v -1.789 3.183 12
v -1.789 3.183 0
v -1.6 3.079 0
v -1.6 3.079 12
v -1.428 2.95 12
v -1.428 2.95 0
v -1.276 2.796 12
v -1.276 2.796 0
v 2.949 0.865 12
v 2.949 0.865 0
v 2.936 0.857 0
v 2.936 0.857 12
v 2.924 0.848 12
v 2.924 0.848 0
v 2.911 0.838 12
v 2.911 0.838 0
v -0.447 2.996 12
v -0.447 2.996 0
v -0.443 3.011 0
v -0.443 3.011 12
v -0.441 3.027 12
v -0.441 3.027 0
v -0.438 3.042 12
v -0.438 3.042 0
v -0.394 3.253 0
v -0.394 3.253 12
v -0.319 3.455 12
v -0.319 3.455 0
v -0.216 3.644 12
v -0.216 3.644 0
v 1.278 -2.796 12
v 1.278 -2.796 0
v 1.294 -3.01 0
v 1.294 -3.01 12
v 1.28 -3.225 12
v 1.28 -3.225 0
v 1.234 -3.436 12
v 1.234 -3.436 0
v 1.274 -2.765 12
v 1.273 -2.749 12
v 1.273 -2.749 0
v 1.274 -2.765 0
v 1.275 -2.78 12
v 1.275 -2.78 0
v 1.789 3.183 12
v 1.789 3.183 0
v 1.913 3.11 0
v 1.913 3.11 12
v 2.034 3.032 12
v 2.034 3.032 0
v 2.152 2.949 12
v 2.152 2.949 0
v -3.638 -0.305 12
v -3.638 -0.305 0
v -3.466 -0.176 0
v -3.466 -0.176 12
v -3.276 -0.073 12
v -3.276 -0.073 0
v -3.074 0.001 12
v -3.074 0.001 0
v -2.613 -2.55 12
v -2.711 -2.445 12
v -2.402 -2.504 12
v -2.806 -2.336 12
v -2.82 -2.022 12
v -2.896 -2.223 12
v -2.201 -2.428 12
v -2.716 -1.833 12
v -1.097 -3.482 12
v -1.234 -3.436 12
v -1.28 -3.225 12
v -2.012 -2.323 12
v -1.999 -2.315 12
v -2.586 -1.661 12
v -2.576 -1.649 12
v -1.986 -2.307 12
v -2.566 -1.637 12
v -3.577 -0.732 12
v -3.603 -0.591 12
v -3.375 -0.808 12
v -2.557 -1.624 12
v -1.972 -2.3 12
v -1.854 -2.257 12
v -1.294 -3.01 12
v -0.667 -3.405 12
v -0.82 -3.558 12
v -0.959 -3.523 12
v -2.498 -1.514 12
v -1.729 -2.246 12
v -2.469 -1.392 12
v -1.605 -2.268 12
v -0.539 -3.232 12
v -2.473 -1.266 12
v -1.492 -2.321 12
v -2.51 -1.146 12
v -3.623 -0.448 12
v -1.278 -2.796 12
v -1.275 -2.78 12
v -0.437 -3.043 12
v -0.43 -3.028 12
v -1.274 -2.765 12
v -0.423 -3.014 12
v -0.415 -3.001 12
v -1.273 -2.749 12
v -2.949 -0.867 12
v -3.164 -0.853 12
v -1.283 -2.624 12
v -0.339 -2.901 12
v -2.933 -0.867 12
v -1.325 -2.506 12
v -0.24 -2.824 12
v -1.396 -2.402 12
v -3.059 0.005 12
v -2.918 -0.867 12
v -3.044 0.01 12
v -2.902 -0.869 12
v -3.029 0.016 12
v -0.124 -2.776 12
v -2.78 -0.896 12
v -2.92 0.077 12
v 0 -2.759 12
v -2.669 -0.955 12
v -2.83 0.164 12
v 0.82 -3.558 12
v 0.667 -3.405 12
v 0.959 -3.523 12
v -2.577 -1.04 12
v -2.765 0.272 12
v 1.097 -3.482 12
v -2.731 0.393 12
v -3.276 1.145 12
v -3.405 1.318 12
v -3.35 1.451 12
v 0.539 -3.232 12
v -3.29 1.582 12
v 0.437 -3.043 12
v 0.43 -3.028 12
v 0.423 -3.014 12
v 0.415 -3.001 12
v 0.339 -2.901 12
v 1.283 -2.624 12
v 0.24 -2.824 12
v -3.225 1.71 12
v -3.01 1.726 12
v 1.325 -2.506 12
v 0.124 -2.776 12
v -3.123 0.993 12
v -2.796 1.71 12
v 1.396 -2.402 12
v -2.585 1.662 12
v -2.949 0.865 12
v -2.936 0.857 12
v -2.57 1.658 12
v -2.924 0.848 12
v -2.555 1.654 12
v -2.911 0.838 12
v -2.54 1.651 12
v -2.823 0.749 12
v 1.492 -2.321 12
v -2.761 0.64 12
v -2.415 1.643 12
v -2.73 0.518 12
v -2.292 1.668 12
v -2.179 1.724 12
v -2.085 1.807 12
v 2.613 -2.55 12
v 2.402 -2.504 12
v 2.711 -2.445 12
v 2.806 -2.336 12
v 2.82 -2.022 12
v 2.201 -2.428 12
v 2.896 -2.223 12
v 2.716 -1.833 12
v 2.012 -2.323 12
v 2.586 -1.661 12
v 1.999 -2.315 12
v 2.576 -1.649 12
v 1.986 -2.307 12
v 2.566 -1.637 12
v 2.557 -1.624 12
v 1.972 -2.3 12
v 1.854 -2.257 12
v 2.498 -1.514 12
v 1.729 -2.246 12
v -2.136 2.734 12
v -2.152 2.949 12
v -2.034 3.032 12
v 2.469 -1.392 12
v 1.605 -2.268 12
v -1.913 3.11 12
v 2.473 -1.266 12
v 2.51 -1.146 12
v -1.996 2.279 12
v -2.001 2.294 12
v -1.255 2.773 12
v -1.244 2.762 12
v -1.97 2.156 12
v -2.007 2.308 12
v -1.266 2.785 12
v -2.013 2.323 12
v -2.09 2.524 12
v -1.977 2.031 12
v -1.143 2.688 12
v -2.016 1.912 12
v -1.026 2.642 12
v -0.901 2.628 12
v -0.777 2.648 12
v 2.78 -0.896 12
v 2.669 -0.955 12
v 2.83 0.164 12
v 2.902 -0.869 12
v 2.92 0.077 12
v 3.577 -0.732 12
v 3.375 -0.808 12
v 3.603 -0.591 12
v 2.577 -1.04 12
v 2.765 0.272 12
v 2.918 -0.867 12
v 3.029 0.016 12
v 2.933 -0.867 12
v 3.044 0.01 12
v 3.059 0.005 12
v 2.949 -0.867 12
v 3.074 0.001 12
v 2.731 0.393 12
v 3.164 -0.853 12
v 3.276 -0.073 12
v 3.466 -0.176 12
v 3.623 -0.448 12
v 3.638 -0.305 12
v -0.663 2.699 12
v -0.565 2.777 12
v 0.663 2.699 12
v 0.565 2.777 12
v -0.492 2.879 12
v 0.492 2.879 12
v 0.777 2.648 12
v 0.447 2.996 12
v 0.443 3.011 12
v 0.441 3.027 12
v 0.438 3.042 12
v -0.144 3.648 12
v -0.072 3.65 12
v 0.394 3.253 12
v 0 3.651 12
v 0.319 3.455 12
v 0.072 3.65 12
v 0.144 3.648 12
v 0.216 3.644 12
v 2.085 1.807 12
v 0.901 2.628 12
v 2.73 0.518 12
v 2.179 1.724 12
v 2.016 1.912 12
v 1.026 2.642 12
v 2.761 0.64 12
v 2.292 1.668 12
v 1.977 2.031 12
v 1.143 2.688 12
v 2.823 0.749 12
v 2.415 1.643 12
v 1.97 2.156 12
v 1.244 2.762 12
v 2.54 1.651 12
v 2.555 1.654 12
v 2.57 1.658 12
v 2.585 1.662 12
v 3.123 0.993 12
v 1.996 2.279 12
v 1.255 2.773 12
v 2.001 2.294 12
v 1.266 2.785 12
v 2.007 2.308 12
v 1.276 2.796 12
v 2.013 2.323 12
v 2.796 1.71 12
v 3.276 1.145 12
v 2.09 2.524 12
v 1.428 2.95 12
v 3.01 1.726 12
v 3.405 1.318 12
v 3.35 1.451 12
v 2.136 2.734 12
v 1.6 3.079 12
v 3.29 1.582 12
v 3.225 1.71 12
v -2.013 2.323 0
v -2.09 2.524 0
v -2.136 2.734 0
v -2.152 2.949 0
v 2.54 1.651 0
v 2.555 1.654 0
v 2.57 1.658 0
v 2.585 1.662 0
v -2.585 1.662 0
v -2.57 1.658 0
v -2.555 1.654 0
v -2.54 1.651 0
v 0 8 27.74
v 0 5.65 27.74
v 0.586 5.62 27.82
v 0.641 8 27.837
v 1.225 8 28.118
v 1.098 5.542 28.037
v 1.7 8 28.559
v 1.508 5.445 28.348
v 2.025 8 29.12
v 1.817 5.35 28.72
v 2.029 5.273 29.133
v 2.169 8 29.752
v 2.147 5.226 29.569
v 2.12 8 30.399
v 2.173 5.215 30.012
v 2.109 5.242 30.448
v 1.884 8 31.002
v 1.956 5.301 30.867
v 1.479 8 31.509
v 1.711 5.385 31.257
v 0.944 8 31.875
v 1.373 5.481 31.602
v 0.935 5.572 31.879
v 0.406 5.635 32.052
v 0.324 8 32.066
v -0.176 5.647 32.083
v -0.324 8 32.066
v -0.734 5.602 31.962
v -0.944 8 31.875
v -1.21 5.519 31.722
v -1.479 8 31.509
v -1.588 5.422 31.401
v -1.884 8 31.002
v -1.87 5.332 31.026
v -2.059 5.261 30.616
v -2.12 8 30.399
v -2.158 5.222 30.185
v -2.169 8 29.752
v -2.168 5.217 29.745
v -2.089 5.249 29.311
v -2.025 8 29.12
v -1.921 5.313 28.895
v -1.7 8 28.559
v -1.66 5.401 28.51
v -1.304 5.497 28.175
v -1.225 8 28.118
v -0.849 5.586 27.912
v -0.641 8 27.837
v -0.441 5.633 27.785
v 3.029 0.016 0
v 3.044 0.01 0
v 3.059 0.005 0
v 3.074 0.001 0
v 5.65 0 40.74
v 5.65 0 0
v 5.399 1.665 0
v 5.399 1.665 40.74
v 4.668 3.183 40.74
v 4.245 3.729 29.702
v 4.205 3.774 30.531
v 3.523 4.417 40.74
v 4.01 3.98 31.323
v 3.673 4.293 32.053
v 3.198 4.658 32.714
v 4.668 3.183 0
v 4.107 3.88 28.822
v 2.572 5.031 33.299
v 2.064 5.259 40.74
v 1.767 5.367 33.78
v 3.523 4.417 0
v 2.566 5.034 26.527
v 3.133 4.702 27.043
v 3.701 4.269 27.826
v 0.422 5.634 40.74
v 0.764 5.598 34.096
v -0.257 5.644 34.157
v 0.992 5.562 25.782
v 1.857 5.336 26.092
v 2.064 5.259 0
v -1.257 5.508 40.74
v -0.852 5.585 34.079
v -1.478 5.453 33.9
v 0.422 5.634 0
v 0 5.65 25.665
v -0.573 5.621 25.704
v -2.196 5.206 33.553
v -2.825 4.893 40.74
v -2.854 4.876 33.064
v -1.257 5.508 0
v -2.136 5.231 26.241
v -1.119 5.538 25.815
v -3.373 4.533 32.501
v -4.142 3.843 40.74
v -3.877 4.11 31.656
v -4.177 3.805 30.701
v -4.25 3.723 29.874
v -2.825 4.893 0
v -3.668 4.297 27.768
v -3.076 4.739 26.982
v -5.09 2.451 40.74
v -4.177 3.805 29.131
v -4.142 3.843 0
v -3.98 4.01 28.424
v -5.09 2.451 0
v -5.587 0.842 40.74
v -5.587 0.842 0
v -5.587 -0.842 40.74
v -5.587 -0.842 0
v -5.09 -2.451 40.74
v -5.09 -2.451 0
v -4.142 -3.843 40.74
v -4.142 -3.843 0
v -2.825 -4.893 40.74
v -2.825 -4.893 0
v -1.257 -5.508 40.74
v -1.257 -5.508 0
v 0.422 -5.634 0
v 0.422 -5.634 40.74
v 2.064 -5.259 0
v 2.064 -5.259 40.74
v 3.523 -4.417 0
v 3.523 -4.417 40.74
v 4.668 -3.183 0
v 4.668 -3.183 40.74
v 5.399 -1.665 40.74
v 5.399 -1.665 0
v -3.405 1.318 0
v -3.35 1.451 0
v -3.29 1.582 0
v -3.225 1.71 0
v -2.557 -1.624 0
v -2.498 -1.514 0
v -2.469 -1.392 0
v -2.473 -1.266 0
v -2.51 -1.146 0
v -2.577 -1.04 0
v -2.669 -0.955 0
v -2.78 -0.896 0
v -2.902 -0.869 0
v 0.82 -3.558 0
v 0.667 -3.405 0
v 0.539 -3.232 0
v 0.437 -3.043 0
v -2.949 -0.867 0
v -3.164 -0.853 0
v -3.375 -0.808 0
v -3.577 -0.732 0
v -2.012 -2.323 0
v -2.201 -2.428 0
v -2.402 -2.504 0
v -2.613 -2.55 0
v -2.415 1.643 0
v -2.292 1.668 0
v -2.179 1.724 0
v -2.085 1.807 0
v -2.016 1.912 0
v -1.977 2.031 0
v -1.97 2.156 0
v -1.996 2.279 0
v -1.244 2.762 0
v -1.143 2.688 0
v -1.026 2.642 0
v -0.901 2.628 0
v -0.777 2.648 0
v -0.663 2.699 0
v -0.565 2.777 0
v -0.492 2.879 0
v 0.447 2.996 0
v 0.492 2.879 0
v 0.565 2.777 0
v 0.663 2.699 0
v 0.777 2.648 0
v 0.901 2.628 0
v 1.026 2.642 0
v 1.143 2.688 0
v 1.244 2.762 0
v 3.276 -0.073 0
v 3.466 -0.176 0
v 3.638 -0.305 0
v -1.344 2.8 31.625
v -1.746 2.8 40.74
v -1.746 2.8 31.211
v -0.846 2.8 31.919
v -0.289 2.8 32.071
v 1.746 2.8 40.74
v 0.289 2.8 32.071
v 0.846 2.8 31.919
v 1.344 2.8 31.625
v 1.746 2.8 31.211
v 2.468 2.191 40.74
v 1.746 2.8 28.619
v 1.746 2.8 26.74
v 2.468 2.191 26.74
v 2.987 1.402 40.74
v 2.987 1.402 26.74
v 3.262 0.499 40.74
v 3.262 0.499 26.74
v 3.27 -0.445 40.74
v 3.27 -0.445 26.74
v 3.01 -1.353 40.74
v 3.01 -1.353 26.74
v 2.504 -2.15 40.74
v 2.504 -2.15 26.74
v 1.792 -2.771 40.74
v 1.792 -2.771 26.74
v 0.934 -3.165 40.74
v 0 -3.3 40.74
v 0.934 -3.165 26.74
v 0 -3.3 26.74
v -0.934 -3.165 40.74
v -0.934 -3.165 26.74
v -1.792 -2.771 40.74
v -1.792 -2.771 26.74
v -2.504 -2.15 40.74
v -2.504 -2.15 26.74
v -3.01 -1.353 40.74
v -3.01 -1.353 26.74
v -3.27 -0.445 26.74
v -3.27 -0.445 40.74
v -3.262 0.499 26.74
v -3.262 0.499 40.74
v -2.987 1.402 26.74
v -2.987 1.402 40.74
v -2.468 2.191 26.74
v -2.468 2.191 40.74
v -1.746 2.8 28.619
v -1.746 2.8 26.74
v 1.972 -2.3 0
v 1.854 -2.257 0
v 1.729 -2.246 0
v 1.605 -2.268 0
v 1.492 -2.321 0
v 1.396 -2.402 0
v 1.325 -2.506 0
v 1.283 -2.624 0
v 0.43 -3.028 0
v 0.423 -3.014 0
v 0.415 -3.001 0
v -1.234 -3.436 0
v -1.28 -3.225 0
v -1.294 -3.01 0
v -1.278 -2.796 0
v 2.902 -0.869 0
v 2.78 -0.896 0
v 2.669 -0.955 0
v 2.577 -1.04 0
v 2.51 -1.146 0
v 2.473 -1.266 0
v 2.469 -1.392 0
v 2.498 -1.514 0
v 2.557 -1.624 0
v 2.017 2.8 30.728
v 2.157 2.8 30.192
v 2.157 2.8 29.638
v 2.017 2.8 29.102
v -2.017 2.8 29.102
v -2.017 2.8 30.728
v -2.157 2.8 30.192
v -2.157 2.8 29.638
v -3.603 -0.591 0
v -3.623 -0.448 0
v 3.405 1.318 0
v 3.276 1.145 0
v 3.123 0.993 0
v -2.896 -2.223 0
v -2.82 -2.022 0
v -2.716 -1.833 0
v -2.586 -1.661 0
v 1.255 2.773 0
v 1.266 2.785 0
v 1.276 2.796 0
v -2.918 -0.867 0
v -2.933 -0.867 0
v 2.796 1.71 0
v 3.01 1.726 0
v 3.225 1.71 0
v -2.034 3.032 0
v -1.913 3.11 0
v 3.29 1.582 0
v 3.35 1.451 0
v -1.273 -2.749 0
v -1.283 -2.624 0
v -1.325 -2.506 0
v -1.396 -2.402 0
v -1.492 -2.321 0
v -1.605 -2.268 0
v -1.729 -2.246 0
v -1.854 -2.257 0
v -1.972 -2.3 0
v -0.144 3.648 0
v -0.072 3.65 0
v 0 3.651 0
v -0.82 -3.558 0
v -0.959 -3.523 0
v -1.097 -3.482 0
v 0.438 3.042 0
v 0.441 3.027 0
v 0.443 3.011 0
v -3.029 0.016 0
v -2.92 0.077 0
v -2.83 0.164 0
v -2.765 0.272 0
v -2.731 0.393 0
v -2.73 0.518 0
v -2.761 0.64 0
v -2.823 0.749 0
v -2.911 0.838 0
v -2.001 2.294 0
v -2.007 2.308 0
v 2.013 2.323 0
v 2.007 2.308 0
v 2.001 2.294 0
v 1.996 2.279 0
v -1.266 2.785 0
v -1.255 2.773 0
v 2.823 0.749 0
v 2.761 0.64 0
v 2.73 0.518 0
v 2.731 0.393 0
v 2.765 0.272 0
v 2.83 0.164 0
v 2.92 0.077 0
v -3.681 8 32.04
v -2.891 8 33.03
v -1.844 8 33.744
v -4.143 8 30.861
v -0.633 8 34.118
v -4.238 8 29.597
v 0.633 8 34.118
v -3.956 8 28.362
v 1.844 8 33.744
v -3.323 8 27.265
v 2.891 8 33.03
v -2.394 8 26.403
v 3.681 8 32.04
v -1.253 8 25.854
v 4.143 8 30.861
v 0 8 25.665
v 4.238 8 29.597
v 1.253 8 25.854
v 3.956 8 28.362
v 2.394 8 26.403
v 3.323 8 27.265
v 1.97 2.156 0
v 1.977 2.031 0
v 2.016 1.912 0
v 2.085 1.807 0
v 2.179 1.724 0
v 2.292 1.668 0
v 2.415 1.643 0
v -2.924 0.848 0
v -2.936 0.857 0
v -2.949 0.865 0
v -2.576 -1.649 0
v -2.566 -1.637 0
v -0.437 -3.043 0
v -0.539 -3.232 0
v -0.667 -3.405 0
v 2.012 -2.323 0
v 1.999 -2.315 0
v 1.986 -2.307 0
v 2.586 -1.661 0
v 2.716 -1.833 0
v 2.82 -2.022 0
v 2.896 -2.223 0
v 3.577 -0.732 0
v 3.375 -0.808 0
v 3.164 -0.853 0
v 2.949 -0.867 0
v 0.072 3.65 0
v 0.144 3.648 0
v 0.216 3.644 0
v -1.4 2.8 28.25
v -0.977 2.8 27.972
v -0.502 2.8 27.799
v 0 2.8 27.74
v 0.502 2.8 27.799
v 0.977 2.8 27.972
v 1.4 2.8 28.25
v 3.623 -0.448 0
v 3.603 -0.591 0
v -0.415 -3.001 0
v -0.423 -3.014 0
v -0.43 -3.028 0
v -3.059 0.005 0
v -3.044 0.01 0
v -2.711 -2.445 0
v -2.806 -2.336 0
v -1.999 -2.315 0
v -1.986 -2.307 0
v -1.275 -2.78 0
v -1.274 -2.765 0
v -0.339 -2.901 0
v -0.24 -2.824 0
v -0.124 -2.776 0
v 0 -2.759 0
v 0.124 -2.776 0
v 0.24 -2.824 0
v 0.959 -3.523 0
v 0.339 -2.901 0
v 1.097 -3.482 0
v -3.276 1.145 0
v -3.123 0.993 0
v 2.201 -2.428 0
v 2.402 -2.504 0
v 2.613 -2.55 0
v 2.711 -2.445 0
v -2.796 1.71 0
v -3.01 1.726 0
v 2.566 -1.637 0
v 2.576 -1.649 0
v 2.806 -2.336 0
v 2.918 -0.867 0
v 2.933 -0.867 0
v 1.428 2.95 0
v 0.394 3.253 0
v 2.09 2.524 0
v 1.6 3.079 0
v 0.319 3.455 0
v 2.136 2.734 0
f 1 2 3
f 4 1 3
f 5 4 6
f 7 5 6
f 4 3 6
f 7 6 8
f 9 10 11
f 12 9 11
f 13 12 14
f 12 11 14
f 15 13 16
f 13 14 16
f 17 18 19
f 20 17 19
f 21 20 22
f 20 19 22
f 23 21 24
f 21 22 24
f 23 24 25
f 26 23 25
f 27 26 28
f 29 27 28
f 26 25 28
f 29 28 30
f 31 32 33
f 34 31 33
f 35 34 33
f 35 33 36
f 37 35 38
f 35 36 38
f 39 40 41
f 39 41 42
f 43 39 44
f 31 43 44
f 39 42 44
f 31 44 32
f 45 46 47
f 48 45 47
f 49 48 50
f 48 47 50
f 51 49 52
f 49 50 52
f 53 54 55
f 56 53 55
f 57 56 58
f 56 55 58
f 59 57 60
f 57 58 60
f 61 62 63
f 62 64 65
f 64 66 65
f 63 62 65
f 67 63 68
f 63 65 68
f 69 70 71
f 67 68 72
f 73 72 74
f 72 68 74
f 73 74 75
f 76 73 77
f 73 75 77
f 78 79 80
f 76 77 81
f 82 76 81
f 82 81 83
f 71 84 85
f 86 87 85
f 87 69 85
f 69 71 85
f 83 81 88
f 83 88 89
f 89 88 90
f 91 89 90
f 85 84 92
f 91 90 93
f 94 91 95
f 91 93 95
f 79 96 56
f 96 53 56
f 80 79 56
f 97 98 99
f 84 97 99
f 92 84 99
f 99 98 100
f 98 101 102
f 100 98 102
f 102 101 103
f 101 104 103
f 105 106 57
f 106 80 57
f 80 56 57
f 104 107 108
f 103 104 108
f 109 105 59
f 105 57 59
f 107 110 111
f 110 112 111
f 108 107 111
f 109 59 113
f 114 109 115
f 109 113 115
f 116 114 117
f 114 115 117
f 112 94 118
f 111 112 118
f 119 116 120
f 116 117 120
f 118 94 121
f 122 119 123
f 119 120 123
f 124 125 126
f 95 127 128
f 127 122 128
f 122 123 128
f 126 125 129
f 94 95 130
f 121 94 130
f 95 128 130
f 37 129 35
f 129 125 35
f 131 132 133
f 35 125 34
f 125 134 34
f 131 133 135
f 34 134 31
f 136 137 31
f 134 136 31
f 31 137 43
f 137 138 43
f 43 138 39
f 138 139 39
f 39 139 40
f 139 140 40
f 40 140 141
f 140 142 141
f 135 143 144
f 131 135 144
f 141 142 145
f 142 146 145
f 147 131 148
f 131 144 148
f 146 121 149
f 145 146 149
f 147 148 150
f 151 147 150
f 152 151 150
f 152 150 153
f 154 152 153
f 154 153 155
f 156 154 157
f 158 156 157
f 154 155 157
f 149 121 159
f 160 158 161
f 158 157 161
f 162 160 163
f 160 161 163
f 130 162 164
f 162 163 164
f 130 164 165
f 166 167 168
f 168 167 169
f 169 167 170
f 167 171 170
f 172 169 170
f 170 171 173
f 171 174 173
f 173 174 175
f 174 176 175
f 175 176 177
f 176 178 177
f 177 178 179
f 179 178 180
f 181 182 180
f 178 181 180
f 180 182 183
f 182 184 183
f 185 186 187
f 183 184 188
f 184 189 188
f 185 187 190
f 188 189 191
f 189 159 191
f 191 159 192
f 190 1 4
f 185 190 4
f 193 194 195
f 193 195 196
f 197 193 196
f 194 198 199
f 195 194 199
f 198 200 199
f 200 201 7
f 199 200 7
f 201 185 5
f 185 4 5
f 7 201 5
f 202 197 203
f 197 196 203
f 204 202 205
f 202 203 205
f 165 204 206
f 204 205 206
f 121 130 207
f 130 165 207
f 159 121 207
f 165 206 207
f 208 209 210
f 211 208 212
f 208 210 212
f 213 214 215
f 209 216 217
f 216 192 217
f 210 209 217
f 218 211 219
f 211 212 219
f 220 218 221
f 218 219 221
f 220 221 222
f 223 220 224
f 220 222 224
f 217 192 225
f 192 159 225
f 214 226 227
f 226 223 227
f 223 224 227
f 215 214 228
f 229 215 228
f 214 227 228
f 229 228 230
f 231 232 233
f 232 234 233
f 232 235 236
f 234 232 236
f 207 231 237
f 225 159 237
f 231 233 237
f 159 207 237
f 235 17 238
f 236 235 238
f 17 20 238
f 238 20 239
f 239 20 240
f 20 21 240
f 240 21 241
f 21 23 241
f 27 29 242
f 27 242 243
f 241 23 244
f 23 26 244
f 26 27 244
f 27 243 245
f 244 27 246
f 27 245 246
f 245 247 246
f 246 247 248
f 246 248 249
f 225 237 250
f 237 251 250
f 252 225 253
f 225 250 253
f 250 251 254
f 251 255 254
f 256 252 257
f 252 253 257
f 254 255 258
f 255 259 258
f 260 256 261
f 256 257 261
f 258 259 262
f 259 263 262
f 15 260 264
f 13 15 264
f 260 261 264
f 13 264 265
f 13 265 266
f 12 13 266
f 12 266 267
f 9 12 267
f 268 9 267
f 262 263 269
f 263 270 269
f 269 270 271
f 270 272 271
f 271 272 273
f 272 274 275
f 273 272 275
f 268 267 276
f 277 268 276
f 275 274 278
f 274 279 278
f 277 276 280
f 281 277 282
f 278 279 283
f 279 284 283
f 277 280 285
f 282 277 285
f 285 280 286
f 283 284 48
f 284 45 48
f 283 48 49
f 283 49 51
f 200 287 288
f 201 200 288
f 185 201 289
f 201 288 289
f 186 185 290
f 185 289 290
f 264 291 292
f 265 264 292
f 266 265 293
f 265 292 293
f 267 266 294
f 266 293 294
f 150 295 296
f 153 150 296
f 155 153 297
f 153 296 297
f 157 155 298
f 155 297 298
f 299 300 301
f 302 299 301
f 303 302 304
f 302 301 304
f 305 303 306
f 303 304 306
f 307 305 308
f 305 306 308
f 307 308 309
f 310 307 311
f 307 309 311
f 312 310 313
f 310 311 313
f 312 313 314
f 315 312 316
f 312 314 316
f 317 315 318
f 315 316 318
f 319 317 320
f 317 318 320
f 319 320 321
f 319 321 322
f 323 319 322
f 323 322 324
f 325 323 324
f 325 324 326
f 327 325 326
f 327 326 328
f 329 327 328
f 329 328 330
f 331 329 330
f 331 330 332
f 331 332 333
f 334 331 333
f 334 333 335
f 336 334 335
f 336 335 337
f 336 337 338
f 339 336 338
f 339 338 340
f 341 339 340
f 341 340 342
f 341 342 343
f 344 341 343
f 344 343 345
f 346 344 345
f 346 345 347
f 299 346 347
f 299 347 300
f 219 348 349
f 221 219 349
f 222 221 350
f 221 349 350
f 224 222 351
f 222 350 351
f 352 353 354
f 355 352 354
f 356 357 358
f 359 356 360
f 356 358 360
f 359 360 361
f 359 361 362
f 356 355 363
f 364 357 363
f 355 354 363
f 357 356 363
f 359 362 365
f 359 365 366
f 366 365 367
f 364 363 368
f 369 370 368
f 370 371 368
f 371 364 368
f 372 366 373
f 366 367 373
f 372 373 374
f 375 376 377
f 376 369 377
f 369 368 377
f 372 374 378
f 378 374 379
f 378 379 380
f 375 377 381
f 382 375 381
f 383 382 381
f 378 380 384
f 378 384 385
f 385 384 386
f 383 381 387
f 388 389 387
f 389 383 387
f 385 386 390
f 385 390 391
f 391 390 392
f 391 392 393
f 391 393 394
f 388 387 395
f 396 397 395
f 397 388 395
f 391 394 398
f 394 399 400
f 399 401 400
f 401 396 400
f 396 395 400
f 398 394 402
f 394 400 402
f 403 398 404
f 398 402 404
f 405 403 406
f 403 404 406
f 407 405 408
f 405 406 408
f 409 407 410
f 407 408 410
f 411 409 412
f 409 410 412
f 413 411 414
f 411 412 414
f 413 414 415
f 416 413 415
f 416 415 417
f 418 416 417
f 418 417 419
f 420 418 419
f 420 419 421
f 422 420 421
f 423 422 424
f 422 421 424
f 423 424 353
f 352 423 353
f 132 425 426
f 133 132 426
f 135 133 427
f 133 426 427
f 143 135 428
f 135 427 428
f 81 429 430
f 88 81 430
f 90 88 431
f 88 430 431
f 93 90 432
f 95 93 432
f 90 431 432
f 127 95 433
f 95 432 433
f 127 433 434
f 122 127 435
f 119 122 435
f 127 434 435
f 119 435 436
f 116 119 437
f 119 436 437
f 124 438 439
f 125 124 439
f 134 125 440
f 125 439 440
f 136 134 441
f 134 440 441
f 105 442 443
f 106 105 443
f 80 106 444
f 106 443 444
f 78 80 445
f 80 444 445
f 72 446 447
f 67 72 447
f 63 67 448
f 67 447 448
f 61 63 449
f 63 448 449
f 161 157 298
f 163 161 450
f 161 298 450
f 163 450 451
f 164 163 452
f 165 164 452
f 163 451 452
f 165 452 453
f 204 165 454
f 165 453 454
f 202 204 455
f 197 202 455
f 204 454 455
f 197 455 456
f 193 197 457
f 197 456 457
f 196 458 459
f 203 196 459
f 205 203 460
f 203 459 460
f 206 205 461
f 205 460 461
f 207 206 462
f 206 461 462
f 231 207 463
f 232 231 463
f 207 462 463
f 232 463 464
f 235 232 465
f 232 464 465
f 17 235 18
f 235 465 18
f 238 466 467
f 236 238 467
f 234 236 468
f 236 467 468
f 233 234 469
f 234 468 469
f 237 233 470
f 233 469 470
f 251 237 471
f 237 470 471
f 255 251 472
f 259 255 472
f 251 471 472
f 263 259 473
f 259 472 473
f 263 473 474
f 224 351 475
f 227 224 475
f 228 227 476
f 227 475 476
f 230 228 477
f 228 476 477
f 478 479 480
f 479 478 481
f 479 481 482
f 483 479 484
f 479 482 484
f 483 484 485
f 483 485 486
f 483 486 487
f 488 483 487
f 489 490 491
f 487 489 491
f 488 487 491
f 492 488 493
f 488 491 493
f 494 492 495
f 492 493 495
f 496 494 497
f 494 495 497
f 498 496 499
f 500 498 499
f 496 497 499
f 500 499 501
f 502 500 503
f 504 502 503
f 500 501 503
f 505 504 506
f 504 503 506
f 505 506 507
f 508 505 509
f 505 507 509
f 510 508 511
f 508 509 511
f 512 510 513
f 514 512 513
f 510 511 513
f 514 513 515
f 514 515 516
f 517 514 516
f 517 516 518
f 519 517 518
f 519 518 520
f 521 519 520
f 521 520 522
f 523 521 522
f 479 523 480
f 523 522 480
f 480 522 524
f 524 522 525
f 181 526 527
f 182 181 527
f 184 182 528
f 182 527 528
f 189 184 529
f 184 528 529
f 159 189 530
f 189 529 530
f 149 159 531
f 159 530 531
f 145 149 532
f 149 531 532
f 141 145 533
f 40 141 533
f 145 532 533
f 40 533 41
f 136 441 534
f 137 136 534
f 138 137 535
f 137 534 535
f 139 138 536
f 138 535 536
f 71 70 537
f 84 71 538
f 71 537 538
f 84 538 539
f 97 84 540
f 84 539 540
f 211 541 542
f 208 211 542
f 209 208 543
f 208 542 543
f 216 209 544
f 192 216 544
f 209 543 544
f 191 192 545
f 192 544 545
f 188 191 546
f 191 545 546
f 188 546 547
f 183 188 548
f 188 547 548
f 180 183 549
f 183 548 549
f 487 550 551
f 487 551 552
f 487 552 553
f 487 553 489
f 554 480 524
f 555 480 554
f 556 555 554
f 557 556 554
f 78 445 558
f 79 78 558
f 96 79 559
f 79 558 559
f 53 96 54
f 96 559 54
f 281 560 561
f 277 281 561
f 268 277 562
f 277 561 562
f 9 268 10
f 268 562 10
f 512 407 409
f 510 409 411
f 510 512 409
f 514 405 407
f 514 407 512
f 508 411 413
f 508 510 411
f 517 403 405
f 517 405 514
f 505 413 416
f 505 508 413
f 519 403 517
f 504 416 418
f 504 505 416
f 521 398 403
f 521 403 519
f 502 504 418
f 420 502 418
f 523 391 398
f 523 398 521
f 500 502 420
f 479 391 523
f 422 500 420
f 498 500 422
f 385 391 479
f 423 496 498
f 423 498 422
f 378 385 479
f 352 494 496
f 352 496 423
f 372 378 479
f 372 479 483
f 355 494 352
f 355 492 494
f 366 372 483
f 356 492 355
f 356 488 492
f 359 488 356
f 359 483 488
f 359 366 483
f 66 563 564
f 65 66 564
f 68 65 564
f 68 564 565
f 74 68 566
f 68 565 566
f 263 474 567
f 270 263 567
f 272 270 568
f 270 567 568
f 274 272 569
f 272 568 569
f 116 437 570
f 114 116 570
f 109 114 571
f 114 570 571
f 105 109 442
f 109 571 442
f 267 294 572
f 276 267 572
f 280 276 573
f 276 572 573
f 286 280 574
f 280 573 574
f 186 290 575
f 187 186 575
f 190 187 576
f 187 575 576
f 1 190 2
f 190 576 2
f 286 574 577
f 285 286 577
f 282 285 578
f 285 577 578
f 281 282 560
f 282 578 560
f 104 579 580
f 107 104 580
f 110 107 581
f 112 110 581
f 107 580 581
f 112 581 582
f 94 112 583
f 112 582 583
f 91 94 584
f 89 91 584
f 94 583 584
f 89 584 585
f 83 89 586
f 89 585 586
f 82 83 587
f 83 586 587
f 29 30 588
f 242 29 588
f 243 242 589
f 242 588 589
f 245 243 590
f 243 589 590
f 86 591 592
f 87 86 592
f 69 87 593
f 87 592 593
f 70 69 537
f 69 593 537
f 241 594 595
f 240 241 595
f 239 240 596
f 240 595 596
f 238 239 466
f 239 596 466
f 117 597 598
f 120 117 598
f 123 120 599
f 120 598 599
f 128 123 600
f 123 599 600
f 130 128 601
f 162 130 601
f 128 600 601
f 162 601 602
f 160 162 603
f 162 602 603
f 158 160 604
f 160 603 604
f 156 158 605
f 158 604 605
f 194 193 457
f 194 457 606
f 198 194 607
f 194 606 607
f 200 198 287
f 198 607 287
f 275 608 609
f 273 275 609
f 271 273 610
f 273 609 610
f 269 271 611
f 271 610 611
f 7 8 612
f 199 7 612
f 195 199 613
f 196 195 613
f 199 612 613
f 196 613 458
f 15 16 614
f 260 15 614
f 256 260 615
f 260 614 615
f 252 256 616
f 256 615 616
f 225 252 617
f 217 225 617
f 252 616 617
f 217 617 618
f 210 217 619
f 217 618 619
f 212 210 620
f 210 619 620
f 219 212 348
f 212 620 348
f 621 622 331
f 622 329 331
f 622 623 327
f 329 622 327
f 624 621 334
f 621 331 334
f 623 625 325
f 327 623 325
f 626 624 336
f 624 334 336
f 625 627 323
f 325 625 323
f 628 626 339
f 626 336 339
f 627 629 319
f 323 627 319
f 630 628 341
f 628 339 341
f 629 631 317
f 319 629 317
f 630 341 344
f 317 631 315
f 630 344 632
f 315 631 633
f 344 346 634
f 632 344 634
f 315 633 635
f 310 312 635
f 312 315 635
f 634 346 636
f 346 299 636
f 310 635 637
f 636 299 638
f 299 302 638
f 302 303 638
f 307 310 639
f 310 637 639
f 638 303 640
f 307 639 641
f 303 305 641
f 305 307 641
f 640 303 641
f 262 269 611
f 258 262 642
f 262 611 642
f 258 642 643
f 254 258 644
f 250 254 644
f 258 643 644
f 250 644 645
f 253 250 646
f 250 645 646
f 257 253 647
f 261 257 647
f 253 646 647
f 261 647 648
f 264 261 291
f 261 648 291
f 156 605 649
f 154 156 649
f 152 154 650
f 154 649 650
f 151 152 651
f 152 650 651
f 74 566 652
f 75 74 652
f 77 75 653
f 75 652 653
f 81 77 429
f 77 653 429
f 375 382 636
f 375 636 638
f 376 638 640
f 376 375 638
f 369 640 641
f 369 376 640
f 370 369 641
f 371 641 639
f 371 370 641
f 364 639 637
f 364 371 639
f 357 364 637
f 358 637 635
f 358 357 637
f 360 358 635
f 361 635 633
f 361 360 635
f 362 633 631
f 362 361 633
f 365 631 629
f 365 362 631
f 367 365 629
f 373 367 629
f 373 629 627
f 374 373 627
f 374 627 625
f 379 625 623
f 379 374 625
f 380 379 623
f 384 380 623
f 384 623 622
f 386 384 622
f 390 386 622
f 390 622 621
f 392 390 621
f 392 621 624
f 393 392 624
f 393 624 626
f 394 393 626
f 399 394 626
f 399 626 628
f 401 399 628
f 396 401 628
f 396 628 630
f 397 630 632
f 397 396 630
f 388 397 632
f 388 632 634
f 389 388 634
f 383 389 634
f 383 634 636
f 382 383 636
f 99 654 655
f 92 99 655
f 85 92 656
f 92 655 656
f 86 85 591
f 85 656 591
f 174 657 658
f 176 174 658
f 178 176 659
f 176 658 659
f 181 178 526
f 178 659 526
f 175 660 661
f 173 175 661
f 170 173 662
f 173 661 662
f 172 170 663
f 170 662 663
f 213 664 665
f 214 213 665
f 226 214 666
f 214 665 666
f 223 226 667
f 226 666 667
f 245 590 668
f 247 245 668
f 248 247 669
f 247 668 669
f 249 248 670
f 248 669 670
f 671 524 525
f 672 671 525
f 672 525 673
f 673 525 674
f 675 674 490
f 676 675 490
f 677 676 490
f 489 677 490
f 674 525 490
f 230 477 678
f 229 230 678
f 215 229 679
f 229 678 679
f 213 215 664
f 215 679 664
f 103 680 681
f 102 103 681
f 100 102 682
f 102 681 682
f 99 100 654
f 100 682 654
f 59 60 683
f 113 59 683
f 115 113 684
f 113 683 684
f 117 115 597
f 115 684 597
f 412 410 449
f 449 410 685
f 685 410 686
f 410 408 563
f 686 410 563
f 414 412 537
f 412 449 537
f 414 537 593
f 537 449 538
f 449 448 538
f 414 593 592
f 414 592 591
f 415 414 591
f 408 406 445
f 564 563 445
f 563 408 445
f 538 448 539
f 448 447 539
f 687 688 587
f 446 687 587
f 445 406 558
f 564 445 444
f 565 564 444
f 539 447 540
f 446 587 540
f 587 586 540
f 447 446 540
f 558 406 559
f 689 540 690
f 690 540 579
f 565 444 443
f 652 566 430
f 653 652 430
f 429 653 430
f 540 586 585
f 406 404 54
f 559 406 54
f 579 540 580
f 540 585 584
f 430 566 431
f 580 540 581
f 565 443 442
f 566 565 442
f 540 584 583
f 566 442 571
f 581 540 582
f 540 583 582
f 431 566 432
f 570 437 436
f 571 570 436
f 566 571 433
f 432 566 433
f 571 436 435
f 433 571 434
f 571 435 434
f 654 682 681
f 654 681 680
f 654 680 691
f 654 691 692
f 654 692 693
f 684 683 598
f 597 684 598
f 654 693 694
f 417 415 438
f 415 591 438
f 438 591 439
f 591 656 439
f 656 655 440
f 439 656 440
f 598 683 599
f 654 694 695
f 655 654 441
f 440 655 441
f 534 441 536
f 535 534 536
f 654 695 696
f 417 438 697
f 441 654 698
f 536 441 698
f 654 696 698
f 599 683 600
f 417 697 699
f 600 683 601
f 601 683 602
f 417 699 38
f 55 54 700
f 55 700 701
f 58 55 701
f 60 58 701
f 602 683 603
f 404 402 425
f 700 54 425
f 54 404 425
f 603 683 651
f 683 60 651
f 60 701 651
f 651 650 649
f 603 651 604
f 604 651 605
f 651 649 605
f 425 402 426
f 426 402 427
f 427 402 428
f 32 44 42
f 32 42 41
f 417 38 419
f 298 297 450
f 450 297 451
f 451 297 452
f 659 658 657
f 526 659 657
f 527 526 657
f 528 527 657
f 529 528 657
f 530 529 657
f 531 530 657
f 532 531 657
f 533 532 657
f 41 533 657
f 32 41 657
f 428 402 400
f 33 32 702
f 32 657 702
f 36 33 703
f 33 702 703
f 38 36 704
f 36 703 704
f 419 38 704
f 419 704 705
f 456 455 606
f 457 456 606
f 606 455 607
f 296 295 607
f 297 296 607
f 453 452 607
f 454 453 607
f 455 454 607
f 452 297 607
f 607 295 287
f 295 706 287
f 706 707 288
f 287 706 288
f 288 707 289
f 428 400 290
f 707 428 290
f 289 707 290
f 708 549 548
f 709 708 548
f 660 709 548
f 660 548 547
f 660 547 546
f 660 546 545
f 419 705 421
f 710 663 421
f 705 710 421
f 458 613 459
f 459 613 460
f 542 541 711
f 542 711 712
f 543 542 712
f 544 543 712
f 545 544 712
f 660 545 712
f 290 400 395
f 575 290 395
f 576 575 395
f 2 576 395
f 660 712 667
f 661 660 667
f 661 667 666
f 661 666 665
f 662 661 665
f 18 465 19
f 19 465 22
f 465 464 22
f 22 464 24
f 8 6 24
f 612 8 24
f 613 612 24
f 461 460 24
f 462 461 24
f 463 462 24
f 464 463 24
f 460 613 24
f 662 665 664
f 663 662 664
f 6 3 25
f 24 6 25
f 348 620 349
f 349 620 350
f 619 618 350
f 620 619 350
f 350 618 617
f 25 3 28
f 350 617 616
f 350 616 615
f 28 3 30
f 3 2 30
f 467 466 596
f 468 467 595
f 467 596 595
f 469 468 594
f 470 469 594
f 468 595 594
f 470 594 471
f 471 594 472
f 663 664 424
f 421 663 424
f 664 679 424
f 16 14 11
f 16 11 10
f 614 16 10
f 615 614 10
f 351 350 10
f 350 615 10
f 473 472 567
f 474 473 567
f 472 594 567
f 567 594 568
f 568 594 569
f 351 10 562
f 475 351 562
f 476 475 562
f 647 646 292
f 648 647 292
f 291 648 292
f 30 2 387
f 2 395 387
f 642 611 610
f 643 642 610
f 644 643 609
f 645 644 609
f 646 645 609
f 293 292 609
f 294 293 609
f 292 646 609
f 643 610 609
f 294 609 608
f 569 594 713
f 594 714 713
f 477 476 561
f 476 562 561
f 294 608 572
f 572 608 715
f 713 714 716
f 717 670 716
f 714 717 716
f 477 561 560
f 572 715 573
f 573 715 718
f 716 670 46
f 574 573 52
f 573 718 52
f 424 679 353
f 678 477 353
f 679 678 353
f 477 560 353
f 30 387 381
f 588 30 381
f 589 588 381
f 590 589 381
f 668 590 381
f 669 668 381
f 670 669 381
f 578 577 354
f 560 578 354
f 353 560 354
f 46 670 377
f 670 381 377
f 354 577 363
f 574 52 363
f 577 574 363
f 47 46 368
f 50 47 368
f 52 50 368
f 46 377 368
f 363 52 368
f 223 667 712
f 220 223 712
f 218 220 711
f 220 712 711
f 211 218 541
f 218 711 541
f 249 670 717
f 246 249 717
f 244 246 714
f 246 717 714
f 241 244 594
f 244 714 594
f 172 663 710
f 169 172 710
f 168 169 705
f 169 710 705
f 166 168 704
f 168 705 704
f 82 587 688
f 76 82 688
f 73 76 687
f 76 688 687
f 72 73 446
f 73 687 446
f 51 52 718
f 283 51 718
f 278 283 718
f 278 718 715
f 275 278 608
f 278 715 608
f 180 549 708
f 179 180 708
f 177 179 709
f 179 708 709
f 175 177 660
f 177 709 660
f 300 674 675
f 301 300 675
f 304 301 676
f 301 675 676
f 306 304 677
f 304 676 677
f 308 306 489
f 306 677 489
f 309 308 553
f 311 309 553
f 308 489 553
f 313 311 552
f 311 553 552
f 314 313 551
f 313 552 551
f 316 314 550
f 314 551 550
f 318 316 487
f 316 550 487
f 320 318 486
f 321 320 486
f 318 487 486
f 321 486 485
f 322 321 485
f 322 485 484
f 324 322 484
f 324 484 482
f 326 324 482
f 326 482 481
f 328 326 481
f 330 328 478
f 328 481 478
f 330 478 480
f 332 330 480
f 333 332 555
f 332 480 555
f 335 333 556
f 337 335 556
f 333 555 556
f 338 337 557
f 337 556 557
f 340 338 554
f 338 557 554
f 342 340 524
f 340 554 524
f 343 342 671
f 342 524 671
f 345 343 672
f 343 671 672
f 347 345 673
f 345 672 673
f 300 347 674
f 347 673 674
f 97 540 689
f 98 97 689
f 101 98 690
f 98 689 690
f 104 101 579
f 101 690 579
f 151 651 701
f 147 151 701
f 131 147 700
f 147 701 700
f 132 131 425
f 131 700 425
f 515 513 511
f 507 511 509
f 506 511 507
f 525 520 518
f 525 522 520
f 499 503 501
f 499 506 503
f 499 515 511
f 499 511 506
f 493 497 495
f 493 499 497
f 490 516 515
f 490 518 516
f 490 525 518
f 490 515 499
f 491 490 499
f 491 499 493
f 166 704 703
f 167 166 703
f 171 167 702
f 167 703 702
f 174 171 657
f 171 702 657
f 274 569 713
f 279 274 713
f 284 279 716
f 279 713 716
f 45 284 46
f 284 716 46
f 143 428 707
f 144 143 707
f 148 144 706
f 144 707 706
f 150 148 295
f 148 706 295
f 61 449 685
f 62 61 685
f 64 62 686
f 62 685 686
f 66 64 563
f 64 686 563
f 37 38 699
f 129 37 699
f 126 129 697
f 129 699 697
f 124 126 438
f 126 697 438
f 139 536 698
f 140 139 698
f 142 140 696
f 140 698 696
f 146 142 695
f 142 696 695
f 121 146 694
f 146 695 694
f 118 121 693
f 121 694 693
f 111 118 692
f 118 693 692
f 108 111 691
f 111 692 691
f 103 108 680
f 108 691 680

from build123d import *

# Parameters (mm, degrees)
SKETCH1_R           = 5.65
BOSS_EXTRUDE1_DEPTH = 12
SKETCH2_R           = 5.65
BOSS_EXTRUDE2_DEPTH = 14.74
SKETCH3_R           = 5.65
BOSS_EXTRUDE3_DEPTH = 14
SKETCH5_R           = 4.25
SKETCH5_R_2         = 2.175
BOSS_EXTRUDE4_DEPTH = 5.2
SKETCH5_2_R         = 2.175
CUT_EXTRUDE1_DEPTH  = 42.988958203


with BuildPart() as part:
    # Sketch1 → Boss-Extrude1 (new body)
    # profile 1 of 12: a face of its own
    with BuildSketch(Plane.XY):
        Circle(SKETCH1_R)
        with BuildLine():
            ThreePointArc((-0.81964124, -3.557591308), (-1.028546403, -3.50290736), (-1.233852984, -3.435967766))
            ThreePointArc((-1.233852984, -3.435967766), (-1.973766094, -3.071239991), (-2.612905161, -2.549704746))
            ThreePointArc((-2.612905161, -2.549704746), (-2.759082994, -2.390759024), (-2.895607604, -2.223448736))
            ThreePointArc((-2.895607604, -2.223448736), (-3.320875399, -1.516592978), (-3.576590156, -0.732304943))
            ThreePointArc((-3.576590156, -0.732304943), (-3.613630229, -0.519561589), (-3.638027269, -0.305000442))
            ThreePointArc((-3.638027269, -0.305000442), (-3.613630229, 0.519561589), (-3.404733048, 1.317596505))
            ThreePointArc((-3.404733048, 1.317596505), (-3.320875399, 1.516592978), (-3.225398981, 1.710283337))
            ThreePointArc((-3.225398981, 1.710283337), (-2.759082994, 2.390759024), (-2.151897253, 2.949170373))
            ThreePointArc((-2.151897253, 2.949170373), (-1.973766094, 3.071239991), (-1.788729306, 3.182564241))
            ThreePointArc((-1.788729306, 3.182564241), (-1.028546403, 3.50290736), (-0.215849285, 3.644403485))
            ThreePointArc((-0.215849285, 3.644403485), (-0.107971873, 3.649193027), (0, 3.650790007))
            ThreePointArc((0, 3.650790007), (0.107971873, 3.649193027), (0.215849285, 3.644403485))
            ThreePointArc((0.215849285, 3.644403485), (1.028546403, 3.50290736), (1.788729306, 3.182564241))
            ThreePointArc((1.788729306, 3.182564241), (1.973766094, 3.071239991), (2.151897253, 2.949170373))
            ThreePointArc((2.151897253, 2.949170373), (2.759082994, 2.390759024), (3.225398981, 1.710283337))
            ThreePointArc((3.225398981, 1.710283337), (3.320875399, 1.516592978), (3.404733048, 1.317596505))
            ThreePointArc((3.404733048, 1.317596505), (3.588748603, 0.670187395), (3.650790007, 0))
            ThreePointArc((3.650790007, 0), (3.647597927, -0.152633677), (3.638027269, -0.305000442))
            ThreePointArc((3.638027269, -0.305000442), (3.613630229, -0.519561589), (3.576590156, -0.732304943))
            ThreePointArc((3.576590156, -0.732304943), (3.320875399, -1.516592978), (2.895607604, -2.223448736))
            ThreePointArc((2.895607604, -2.223448736), (2.759082994, -2.390759024), (2.612905161, -2.549704746))
            ThreePointArc((2.612905161, -2.549704746), (1.973766094, -3.071239991), (1.233852984, -3.435967766))
            ThreePointArc((1.233852984, -3.435967766), (1.028546403, -3.50290736), (0.81964124, -3.557591308))
            ThreePointArc((0.81964124, -3.557591308), (0, -3.650790007), (-0.81964124, -3.557591308))
        make_face(mode=Mode.SUBTRACT)
    # profile 2 of 12: a face of its own
    with BuildSketch(Plane.XY):
        with BuildLine():
            ThreePointArc((-2.151897253, 2.949170373), (-2.759082994, 2.390759024), (-3.225398981, 1.710283337))
            ThreePointArc((-3.225398981, 1.710283337), (-2.902782795, 1.721509121), (-2.585426091, 1.662416447))
            ThreePointArc((-2.585426091, 1.662416447), (-2.562741672, 1.6561643), (-2.539777266, 1.651035136))
            ThreePointArc((-2.539777266, 1.651035136), (-2.085465777, 1.807066382), (-1.99567797, 2.278959198))
            ThreePointArc((-1.99567797, 2.278959198), (-2.004023102, 2.300959902), (-2.013439941, 2.322523654))
            ThreePointArc((-2.013439941, 2.322523654), (-2.117095704, 2.628240359), (-2.151897253, 2.949170373))
        make_face()
    # profile 3 of 12: a face of its own
    with BuildSketch(Plane.XY):
        with BuildLine():
            ThreePointArc((-0.215849285, 3.644403485), (-1.028546403, 3.50290736), (-1.788729306, 3.182564241))
            ThreePointArc((-1.788729306, 3.182564241), (-1.511258183, 3.017588493), (-1.276228646, 2.796300584))
            ThreePointArc((-1.276228646, 2.796300584), (-1.260525464, 2.77877682), (-1.243979612, 2.762046398))
            ThreePointArc((-1.243979612, 2.762046398), (-0.777431606, 2.6476889), (-0.446772779, 2.996127445))
            ThreePointArc((-0.446772779, 2.996127445), (-0.441898672, 3.019147334), (-0.438162377, 3.042379044))
            ThreePointArc((-0.438162377, 3.042379044), (-0.360080224, 3.355604839), (-0.215849285, 3.644403485))
        make_face()
    # profile 4 of 12: a face of its own
    with BuildSketch(Plane.XY):
        with BuildLine():
            ThreePointArc((1.788729306, 3.182564241), (1.028546403, 3.50290736), (0.215849285, 3.644403485))
            ThreePointArc((0.215849285, 3.644403485), (0.360080224, 3.355604839), (0.438162377, 3.042379044))
            ThreePointArc((0.438162377, 3.042379044), (0.441898672, 3.019147334), (0.446772779, 2.996127445))
            ThreePointArc((0.446772779, 2.996127445), (0.777431606, 2.6476889), (1.243979612, 2.762046398))
            ThreePointArc((1.243979612, 2.762046398), (1.260525464, 2.77877682), (1.276228646, 2.796300584))
            ThreePointArc((1.276228646, 2.796300584), (1.511258183, 3.017588493), (1.788729306, 3.182564241))
        make_face()
    # profile 5 of 12: a face of its own
    with BuildSketch(Plane.XY):
        with BuildLine():
            ThreePointArc((2.585426091, 1.662416447), (2.902782795, 1.721509121), (3.225398981, 1.710283337))
            ThreePointArc((3.225398981, 1.710283337), (2.759082994, 2.390759024), (2.151897253, 2.949170373))
            ThreePointArc((2.151897253, 2.949170373), (2.117095704, 2.628240359), (2.013439941, 2.322523654))
            ThreePointArc((2.013439941, 2.322523654), (2.004023102, 2.300959902), (1.99567797, 2.278959198))
            ThreePointArc((1.99567797, 2.278959198), (2.085465777, 1.807066382), (2.539777266, 1.651035136))
            ThreePointArc((2.539777266, 1.651035136), (2.562741672, 1.6561643), (2.585426091, 1.662416447))
        make_face()
    # profile 6 of 12: a face of its own
    with BuildSketch(Plane.XY):
        with BuildLine():
            ThreePointArc((3.07376902, 0.000726834), (3.372694379, -0.121137234), (3.638027269, -0.305000442))
            ThreePointArc((3.638027269, -0.305000442), (3.647597927, -0.152633677), (3.650790007, 0))
            ThreePointArc((3.650790007, 0), (3.588748603, 0.670187395), (3.404733048, 1.317596505))
            ThreePointArc((3.404733048, 1.317596505), (3.201948257, 1.066428135), (2.94946455, 0.865283413))
            ThreePointArc((2.94946455, 0.865283413), (2.929884357, 0.852233959), (2.910969506, 0.838237507))
            ThreePointArc((2.910969506, 0.838237507), (2.731379298, 0.392713056), (3.029213584, 0.015831883))
            ThreePointArc((3.029213584, 0.015831883), (3.051305506, 0.007731316), (3.07376902, 0.000726834))
        make_face()
    # profile 7 of 12: a face of its own
    with BuildSketch(Plane.XY):
        with BuildLine():
            ThreePointArc((2.586212003, -1.661193544), (2.771799329, -1.925323372), (2.895607604, -2.223448736))
            ThreePointArc((2.895607604, -2.223448736), (3.320875399, -1.516592978), (3.576590156, -0.732304943))
            ThreePointArc((3.576590156, -0.732304943), (3.270204862, -0.833967486), (2.949055004, -0.866678197))
            ThreePointArc((2.949055004, -0.866678197), (2.92552803, -0.867070245), (2.902048792, -0.868618669))
            ThreePointArc((2.902048792, -0.868618669), (2.510099192, -1.146323891), (2.556895991, -1.62439788))
            ThreePointArc((2.556895991, -1.62439788), (2.571101401, -1.643156306), (2.586212003, -1.661193544))
        make_face()
    # profile 8 of 12: a face of its own
    with BuildSketch(Plane.XY):
        with BuildLine():
            ThreePointArc((1.277550948, -2.79569671), (1.290877576, -3.118232944), (1.233852984, -3.435967766))
            ThreePointArc((1.233852984, -3.435967766), (1.973766094, -3.071239991), (2.612905161, -2.549704746))
            ThreePointArc((2.612905161, -2.549704746), (2.300194531, -2.469584323), (2.012341335, -2.323475602))
            ThreePointArc((2.012341335, -2.323475602), (1.992337228, -2.311085771), (1.971748095, -2.299694554))
            ThreePointArc((1.971748095, -2.299694554), (1.491880328, -2.321411101), (1.272781988, -2.748892795))
            ThreePointArc((1.272781988, -2.748892795), (1.274590768, -2.772353412), (1.277550948, -2.79569671))
        make_face()
    # profile 9 of 12: a face of its own
    with BuildSketch(Plane.XY):
        with BuildLine():
            ThreePointArc((-0.436723505, -3.042585922), (-0.599888686, -3.321125588), (-0.81964124, -3.557591308))
            ThreePointArc((-0.81964124, -3.557591308), (0, -3.650790007), (0.81964124, -3.557591308))
            ThreePointArc((0.81964124, -3.557591308), (0.599888686, -3.321125588), (0.436723505, -3.042585922))
            ThreePointArc((0.436723505, -3.042585922), (0.426593428, -3.021347897), (0.415431304, -3.00063367))
            ThreePointArc((0.415431304, -3.00063367), (0, -2.75946669), (-0.415431304, -3.000633669))
            ThreePointArc((-0.415431304, -3.000633669), (-0.426593428, -3.021347896), (-0.436723505, -3.042585922))
        make_face()
    # profile 10 of 12: a face of its own
    with BuildSketch(Plane.XY):
        with BuildLine():
            ThreePointArc((-1.233852984, -3.435967766), (-1.290877576, -3.118232944), (-1.277550949, -2.79569671))
            ThreePointArc((-1.277550949, -2.79569671), (-1.274590768, -2.772353411), (-1.272781988, -2.748892794))
            ThreePointArc((-1.272781988, -2.748892794), (-1.491880327, -2.321411102), (-1.971748091, -2.299694555))
            ThreePointArc((-1.971748091, -2.299694555), (-1.992337225, -2.311085772), (-2.012341332, -2.323475603))
            ThreePointArc((-2.012341332, -2.323475603), (-2.300194529, -2.469584324), (-2.612905161, -2.549704746))
            ThreePointArc((-2.612905161, -2.549704746), (-1.973766094, -3.071239991), (-1.233852984, -3.435967766))
        make_face()
    # profile 11 of 12: a face of its own
    with BuildSketch(Plane.XY):
        with BuildLine():
            ThreePointArc((-3.576590156, -0.732304943), (-3.320875399, -1.516592978), (-2.895607604, -2.223448736))
            ThreePointArc((-2.895607604, -2.223448736), (-2.771799329, -1.925323372), (-2.586212003, -1.661193544))
            ThreePointArc((-2.586212003, -1.661193544), (-2.571101401, -1.643156306), (-2.556895991, -1.62439788))
            ThreePointArc((-2.556895991, -1.62439788), (-2.510099192, -1.146323891), (-2.902048792, -0.868618669))
            ThreePointArc((-2.902048792, -0.868618669), (-2.92552803, -0.867070245), (-2.949055004, -0.866678197))
            ThreePointArc((-2.949055004, -0.866678197), (-3.270204862, -0.833967486), (-3.576590156, -0.732304943))
        make_face()
    # profile 12 of 12: a face of its own
    with BuildSketch(Plane.XY):
        with BuildLine():
            ThreePointArc((-3.404733048, 1.317596505), (-3.613630229, 0.519561589), (-3.638027269, -0.305000442))
            ThreePointArc((-3.638027269, -0.305000442), (-3.372694379, -0.121137234), (-3.07376902, 0.000726834))
            ThreePointArc((-3.07376902, 0.000726834), (-3.051305506, 0.007731316), (-3.029213584, 0.015831883))
            ThreePointArc((-3.029213584, 0.015831883), (-2.731379298, 0.392713056), (-2.910969506, 0.838237507))
            ThreePointArc((-2.910969506, 0.838237507), (-2.929884357, 0.852233959), (-2.94946455, 0.865283413))
            ThreePointArc((-2.94946455, 0.865283413), (-3.201948257, 1.066428135), (-3.404733048, 1.317596505))
        make_face()
    extrude(amount=BOSS_EXTRUDE1_DEPTH)

    # Sketch2 → Boss-Extrude2 (add)
    with BuildSketch(Plane.XY.offset(12)):
        Circle(SKETCH2_R)
    extrude(amount=BOSS_EXTRUDE2_DEPTH)

    # Sketch3 → Boss-Extrude3 (add)
    with BuildSketch(Plane.XY.offset(26.74)):
        Circle(SKETCH3_R)
        with BuildLine():
            Line((-1.74642492, 2.8), (1.74642492, 2.8))
            ThreePointArc((1.74642492, 2.8), (0, -3.3), (-1.74642492, 2.8))
        make_face(mode=Mode.SUBTRACT)
    extrude(amount=BOSS_EXTRUDE3_DEPTH)

    # Sketch5 → Boss-Extrude4 (add)
    with BuildSketch(Plane.XZ.offset(-2.8)):
        with Locations(Location((0, 29.915, 0), (0, 0, 270))):
            Circle(SKETCH5_R)
        with Locations(Location((0, 29.915, 0), (0, 0, 270))):
            Circle(SKETCH5_R_2, mode=Mode.SUBTRACT)
    extrude(amount=-BOSS_EXTRUDE4_DEPTH)

    # Sketch5<2> → Cut-Extrude1 (cut, through all)
    with BuildSketch(Plane.XZ.offset(-2.8)):
        with Locations(Location((0, 29.915, 0), (0, 0, 270))):
            Circle(SKETCH5_2_R)
    extrude(amount=-CUT_EXTRUDE1_DEPTH, mode=Mode.SUBTRACT)


solid = part.part
